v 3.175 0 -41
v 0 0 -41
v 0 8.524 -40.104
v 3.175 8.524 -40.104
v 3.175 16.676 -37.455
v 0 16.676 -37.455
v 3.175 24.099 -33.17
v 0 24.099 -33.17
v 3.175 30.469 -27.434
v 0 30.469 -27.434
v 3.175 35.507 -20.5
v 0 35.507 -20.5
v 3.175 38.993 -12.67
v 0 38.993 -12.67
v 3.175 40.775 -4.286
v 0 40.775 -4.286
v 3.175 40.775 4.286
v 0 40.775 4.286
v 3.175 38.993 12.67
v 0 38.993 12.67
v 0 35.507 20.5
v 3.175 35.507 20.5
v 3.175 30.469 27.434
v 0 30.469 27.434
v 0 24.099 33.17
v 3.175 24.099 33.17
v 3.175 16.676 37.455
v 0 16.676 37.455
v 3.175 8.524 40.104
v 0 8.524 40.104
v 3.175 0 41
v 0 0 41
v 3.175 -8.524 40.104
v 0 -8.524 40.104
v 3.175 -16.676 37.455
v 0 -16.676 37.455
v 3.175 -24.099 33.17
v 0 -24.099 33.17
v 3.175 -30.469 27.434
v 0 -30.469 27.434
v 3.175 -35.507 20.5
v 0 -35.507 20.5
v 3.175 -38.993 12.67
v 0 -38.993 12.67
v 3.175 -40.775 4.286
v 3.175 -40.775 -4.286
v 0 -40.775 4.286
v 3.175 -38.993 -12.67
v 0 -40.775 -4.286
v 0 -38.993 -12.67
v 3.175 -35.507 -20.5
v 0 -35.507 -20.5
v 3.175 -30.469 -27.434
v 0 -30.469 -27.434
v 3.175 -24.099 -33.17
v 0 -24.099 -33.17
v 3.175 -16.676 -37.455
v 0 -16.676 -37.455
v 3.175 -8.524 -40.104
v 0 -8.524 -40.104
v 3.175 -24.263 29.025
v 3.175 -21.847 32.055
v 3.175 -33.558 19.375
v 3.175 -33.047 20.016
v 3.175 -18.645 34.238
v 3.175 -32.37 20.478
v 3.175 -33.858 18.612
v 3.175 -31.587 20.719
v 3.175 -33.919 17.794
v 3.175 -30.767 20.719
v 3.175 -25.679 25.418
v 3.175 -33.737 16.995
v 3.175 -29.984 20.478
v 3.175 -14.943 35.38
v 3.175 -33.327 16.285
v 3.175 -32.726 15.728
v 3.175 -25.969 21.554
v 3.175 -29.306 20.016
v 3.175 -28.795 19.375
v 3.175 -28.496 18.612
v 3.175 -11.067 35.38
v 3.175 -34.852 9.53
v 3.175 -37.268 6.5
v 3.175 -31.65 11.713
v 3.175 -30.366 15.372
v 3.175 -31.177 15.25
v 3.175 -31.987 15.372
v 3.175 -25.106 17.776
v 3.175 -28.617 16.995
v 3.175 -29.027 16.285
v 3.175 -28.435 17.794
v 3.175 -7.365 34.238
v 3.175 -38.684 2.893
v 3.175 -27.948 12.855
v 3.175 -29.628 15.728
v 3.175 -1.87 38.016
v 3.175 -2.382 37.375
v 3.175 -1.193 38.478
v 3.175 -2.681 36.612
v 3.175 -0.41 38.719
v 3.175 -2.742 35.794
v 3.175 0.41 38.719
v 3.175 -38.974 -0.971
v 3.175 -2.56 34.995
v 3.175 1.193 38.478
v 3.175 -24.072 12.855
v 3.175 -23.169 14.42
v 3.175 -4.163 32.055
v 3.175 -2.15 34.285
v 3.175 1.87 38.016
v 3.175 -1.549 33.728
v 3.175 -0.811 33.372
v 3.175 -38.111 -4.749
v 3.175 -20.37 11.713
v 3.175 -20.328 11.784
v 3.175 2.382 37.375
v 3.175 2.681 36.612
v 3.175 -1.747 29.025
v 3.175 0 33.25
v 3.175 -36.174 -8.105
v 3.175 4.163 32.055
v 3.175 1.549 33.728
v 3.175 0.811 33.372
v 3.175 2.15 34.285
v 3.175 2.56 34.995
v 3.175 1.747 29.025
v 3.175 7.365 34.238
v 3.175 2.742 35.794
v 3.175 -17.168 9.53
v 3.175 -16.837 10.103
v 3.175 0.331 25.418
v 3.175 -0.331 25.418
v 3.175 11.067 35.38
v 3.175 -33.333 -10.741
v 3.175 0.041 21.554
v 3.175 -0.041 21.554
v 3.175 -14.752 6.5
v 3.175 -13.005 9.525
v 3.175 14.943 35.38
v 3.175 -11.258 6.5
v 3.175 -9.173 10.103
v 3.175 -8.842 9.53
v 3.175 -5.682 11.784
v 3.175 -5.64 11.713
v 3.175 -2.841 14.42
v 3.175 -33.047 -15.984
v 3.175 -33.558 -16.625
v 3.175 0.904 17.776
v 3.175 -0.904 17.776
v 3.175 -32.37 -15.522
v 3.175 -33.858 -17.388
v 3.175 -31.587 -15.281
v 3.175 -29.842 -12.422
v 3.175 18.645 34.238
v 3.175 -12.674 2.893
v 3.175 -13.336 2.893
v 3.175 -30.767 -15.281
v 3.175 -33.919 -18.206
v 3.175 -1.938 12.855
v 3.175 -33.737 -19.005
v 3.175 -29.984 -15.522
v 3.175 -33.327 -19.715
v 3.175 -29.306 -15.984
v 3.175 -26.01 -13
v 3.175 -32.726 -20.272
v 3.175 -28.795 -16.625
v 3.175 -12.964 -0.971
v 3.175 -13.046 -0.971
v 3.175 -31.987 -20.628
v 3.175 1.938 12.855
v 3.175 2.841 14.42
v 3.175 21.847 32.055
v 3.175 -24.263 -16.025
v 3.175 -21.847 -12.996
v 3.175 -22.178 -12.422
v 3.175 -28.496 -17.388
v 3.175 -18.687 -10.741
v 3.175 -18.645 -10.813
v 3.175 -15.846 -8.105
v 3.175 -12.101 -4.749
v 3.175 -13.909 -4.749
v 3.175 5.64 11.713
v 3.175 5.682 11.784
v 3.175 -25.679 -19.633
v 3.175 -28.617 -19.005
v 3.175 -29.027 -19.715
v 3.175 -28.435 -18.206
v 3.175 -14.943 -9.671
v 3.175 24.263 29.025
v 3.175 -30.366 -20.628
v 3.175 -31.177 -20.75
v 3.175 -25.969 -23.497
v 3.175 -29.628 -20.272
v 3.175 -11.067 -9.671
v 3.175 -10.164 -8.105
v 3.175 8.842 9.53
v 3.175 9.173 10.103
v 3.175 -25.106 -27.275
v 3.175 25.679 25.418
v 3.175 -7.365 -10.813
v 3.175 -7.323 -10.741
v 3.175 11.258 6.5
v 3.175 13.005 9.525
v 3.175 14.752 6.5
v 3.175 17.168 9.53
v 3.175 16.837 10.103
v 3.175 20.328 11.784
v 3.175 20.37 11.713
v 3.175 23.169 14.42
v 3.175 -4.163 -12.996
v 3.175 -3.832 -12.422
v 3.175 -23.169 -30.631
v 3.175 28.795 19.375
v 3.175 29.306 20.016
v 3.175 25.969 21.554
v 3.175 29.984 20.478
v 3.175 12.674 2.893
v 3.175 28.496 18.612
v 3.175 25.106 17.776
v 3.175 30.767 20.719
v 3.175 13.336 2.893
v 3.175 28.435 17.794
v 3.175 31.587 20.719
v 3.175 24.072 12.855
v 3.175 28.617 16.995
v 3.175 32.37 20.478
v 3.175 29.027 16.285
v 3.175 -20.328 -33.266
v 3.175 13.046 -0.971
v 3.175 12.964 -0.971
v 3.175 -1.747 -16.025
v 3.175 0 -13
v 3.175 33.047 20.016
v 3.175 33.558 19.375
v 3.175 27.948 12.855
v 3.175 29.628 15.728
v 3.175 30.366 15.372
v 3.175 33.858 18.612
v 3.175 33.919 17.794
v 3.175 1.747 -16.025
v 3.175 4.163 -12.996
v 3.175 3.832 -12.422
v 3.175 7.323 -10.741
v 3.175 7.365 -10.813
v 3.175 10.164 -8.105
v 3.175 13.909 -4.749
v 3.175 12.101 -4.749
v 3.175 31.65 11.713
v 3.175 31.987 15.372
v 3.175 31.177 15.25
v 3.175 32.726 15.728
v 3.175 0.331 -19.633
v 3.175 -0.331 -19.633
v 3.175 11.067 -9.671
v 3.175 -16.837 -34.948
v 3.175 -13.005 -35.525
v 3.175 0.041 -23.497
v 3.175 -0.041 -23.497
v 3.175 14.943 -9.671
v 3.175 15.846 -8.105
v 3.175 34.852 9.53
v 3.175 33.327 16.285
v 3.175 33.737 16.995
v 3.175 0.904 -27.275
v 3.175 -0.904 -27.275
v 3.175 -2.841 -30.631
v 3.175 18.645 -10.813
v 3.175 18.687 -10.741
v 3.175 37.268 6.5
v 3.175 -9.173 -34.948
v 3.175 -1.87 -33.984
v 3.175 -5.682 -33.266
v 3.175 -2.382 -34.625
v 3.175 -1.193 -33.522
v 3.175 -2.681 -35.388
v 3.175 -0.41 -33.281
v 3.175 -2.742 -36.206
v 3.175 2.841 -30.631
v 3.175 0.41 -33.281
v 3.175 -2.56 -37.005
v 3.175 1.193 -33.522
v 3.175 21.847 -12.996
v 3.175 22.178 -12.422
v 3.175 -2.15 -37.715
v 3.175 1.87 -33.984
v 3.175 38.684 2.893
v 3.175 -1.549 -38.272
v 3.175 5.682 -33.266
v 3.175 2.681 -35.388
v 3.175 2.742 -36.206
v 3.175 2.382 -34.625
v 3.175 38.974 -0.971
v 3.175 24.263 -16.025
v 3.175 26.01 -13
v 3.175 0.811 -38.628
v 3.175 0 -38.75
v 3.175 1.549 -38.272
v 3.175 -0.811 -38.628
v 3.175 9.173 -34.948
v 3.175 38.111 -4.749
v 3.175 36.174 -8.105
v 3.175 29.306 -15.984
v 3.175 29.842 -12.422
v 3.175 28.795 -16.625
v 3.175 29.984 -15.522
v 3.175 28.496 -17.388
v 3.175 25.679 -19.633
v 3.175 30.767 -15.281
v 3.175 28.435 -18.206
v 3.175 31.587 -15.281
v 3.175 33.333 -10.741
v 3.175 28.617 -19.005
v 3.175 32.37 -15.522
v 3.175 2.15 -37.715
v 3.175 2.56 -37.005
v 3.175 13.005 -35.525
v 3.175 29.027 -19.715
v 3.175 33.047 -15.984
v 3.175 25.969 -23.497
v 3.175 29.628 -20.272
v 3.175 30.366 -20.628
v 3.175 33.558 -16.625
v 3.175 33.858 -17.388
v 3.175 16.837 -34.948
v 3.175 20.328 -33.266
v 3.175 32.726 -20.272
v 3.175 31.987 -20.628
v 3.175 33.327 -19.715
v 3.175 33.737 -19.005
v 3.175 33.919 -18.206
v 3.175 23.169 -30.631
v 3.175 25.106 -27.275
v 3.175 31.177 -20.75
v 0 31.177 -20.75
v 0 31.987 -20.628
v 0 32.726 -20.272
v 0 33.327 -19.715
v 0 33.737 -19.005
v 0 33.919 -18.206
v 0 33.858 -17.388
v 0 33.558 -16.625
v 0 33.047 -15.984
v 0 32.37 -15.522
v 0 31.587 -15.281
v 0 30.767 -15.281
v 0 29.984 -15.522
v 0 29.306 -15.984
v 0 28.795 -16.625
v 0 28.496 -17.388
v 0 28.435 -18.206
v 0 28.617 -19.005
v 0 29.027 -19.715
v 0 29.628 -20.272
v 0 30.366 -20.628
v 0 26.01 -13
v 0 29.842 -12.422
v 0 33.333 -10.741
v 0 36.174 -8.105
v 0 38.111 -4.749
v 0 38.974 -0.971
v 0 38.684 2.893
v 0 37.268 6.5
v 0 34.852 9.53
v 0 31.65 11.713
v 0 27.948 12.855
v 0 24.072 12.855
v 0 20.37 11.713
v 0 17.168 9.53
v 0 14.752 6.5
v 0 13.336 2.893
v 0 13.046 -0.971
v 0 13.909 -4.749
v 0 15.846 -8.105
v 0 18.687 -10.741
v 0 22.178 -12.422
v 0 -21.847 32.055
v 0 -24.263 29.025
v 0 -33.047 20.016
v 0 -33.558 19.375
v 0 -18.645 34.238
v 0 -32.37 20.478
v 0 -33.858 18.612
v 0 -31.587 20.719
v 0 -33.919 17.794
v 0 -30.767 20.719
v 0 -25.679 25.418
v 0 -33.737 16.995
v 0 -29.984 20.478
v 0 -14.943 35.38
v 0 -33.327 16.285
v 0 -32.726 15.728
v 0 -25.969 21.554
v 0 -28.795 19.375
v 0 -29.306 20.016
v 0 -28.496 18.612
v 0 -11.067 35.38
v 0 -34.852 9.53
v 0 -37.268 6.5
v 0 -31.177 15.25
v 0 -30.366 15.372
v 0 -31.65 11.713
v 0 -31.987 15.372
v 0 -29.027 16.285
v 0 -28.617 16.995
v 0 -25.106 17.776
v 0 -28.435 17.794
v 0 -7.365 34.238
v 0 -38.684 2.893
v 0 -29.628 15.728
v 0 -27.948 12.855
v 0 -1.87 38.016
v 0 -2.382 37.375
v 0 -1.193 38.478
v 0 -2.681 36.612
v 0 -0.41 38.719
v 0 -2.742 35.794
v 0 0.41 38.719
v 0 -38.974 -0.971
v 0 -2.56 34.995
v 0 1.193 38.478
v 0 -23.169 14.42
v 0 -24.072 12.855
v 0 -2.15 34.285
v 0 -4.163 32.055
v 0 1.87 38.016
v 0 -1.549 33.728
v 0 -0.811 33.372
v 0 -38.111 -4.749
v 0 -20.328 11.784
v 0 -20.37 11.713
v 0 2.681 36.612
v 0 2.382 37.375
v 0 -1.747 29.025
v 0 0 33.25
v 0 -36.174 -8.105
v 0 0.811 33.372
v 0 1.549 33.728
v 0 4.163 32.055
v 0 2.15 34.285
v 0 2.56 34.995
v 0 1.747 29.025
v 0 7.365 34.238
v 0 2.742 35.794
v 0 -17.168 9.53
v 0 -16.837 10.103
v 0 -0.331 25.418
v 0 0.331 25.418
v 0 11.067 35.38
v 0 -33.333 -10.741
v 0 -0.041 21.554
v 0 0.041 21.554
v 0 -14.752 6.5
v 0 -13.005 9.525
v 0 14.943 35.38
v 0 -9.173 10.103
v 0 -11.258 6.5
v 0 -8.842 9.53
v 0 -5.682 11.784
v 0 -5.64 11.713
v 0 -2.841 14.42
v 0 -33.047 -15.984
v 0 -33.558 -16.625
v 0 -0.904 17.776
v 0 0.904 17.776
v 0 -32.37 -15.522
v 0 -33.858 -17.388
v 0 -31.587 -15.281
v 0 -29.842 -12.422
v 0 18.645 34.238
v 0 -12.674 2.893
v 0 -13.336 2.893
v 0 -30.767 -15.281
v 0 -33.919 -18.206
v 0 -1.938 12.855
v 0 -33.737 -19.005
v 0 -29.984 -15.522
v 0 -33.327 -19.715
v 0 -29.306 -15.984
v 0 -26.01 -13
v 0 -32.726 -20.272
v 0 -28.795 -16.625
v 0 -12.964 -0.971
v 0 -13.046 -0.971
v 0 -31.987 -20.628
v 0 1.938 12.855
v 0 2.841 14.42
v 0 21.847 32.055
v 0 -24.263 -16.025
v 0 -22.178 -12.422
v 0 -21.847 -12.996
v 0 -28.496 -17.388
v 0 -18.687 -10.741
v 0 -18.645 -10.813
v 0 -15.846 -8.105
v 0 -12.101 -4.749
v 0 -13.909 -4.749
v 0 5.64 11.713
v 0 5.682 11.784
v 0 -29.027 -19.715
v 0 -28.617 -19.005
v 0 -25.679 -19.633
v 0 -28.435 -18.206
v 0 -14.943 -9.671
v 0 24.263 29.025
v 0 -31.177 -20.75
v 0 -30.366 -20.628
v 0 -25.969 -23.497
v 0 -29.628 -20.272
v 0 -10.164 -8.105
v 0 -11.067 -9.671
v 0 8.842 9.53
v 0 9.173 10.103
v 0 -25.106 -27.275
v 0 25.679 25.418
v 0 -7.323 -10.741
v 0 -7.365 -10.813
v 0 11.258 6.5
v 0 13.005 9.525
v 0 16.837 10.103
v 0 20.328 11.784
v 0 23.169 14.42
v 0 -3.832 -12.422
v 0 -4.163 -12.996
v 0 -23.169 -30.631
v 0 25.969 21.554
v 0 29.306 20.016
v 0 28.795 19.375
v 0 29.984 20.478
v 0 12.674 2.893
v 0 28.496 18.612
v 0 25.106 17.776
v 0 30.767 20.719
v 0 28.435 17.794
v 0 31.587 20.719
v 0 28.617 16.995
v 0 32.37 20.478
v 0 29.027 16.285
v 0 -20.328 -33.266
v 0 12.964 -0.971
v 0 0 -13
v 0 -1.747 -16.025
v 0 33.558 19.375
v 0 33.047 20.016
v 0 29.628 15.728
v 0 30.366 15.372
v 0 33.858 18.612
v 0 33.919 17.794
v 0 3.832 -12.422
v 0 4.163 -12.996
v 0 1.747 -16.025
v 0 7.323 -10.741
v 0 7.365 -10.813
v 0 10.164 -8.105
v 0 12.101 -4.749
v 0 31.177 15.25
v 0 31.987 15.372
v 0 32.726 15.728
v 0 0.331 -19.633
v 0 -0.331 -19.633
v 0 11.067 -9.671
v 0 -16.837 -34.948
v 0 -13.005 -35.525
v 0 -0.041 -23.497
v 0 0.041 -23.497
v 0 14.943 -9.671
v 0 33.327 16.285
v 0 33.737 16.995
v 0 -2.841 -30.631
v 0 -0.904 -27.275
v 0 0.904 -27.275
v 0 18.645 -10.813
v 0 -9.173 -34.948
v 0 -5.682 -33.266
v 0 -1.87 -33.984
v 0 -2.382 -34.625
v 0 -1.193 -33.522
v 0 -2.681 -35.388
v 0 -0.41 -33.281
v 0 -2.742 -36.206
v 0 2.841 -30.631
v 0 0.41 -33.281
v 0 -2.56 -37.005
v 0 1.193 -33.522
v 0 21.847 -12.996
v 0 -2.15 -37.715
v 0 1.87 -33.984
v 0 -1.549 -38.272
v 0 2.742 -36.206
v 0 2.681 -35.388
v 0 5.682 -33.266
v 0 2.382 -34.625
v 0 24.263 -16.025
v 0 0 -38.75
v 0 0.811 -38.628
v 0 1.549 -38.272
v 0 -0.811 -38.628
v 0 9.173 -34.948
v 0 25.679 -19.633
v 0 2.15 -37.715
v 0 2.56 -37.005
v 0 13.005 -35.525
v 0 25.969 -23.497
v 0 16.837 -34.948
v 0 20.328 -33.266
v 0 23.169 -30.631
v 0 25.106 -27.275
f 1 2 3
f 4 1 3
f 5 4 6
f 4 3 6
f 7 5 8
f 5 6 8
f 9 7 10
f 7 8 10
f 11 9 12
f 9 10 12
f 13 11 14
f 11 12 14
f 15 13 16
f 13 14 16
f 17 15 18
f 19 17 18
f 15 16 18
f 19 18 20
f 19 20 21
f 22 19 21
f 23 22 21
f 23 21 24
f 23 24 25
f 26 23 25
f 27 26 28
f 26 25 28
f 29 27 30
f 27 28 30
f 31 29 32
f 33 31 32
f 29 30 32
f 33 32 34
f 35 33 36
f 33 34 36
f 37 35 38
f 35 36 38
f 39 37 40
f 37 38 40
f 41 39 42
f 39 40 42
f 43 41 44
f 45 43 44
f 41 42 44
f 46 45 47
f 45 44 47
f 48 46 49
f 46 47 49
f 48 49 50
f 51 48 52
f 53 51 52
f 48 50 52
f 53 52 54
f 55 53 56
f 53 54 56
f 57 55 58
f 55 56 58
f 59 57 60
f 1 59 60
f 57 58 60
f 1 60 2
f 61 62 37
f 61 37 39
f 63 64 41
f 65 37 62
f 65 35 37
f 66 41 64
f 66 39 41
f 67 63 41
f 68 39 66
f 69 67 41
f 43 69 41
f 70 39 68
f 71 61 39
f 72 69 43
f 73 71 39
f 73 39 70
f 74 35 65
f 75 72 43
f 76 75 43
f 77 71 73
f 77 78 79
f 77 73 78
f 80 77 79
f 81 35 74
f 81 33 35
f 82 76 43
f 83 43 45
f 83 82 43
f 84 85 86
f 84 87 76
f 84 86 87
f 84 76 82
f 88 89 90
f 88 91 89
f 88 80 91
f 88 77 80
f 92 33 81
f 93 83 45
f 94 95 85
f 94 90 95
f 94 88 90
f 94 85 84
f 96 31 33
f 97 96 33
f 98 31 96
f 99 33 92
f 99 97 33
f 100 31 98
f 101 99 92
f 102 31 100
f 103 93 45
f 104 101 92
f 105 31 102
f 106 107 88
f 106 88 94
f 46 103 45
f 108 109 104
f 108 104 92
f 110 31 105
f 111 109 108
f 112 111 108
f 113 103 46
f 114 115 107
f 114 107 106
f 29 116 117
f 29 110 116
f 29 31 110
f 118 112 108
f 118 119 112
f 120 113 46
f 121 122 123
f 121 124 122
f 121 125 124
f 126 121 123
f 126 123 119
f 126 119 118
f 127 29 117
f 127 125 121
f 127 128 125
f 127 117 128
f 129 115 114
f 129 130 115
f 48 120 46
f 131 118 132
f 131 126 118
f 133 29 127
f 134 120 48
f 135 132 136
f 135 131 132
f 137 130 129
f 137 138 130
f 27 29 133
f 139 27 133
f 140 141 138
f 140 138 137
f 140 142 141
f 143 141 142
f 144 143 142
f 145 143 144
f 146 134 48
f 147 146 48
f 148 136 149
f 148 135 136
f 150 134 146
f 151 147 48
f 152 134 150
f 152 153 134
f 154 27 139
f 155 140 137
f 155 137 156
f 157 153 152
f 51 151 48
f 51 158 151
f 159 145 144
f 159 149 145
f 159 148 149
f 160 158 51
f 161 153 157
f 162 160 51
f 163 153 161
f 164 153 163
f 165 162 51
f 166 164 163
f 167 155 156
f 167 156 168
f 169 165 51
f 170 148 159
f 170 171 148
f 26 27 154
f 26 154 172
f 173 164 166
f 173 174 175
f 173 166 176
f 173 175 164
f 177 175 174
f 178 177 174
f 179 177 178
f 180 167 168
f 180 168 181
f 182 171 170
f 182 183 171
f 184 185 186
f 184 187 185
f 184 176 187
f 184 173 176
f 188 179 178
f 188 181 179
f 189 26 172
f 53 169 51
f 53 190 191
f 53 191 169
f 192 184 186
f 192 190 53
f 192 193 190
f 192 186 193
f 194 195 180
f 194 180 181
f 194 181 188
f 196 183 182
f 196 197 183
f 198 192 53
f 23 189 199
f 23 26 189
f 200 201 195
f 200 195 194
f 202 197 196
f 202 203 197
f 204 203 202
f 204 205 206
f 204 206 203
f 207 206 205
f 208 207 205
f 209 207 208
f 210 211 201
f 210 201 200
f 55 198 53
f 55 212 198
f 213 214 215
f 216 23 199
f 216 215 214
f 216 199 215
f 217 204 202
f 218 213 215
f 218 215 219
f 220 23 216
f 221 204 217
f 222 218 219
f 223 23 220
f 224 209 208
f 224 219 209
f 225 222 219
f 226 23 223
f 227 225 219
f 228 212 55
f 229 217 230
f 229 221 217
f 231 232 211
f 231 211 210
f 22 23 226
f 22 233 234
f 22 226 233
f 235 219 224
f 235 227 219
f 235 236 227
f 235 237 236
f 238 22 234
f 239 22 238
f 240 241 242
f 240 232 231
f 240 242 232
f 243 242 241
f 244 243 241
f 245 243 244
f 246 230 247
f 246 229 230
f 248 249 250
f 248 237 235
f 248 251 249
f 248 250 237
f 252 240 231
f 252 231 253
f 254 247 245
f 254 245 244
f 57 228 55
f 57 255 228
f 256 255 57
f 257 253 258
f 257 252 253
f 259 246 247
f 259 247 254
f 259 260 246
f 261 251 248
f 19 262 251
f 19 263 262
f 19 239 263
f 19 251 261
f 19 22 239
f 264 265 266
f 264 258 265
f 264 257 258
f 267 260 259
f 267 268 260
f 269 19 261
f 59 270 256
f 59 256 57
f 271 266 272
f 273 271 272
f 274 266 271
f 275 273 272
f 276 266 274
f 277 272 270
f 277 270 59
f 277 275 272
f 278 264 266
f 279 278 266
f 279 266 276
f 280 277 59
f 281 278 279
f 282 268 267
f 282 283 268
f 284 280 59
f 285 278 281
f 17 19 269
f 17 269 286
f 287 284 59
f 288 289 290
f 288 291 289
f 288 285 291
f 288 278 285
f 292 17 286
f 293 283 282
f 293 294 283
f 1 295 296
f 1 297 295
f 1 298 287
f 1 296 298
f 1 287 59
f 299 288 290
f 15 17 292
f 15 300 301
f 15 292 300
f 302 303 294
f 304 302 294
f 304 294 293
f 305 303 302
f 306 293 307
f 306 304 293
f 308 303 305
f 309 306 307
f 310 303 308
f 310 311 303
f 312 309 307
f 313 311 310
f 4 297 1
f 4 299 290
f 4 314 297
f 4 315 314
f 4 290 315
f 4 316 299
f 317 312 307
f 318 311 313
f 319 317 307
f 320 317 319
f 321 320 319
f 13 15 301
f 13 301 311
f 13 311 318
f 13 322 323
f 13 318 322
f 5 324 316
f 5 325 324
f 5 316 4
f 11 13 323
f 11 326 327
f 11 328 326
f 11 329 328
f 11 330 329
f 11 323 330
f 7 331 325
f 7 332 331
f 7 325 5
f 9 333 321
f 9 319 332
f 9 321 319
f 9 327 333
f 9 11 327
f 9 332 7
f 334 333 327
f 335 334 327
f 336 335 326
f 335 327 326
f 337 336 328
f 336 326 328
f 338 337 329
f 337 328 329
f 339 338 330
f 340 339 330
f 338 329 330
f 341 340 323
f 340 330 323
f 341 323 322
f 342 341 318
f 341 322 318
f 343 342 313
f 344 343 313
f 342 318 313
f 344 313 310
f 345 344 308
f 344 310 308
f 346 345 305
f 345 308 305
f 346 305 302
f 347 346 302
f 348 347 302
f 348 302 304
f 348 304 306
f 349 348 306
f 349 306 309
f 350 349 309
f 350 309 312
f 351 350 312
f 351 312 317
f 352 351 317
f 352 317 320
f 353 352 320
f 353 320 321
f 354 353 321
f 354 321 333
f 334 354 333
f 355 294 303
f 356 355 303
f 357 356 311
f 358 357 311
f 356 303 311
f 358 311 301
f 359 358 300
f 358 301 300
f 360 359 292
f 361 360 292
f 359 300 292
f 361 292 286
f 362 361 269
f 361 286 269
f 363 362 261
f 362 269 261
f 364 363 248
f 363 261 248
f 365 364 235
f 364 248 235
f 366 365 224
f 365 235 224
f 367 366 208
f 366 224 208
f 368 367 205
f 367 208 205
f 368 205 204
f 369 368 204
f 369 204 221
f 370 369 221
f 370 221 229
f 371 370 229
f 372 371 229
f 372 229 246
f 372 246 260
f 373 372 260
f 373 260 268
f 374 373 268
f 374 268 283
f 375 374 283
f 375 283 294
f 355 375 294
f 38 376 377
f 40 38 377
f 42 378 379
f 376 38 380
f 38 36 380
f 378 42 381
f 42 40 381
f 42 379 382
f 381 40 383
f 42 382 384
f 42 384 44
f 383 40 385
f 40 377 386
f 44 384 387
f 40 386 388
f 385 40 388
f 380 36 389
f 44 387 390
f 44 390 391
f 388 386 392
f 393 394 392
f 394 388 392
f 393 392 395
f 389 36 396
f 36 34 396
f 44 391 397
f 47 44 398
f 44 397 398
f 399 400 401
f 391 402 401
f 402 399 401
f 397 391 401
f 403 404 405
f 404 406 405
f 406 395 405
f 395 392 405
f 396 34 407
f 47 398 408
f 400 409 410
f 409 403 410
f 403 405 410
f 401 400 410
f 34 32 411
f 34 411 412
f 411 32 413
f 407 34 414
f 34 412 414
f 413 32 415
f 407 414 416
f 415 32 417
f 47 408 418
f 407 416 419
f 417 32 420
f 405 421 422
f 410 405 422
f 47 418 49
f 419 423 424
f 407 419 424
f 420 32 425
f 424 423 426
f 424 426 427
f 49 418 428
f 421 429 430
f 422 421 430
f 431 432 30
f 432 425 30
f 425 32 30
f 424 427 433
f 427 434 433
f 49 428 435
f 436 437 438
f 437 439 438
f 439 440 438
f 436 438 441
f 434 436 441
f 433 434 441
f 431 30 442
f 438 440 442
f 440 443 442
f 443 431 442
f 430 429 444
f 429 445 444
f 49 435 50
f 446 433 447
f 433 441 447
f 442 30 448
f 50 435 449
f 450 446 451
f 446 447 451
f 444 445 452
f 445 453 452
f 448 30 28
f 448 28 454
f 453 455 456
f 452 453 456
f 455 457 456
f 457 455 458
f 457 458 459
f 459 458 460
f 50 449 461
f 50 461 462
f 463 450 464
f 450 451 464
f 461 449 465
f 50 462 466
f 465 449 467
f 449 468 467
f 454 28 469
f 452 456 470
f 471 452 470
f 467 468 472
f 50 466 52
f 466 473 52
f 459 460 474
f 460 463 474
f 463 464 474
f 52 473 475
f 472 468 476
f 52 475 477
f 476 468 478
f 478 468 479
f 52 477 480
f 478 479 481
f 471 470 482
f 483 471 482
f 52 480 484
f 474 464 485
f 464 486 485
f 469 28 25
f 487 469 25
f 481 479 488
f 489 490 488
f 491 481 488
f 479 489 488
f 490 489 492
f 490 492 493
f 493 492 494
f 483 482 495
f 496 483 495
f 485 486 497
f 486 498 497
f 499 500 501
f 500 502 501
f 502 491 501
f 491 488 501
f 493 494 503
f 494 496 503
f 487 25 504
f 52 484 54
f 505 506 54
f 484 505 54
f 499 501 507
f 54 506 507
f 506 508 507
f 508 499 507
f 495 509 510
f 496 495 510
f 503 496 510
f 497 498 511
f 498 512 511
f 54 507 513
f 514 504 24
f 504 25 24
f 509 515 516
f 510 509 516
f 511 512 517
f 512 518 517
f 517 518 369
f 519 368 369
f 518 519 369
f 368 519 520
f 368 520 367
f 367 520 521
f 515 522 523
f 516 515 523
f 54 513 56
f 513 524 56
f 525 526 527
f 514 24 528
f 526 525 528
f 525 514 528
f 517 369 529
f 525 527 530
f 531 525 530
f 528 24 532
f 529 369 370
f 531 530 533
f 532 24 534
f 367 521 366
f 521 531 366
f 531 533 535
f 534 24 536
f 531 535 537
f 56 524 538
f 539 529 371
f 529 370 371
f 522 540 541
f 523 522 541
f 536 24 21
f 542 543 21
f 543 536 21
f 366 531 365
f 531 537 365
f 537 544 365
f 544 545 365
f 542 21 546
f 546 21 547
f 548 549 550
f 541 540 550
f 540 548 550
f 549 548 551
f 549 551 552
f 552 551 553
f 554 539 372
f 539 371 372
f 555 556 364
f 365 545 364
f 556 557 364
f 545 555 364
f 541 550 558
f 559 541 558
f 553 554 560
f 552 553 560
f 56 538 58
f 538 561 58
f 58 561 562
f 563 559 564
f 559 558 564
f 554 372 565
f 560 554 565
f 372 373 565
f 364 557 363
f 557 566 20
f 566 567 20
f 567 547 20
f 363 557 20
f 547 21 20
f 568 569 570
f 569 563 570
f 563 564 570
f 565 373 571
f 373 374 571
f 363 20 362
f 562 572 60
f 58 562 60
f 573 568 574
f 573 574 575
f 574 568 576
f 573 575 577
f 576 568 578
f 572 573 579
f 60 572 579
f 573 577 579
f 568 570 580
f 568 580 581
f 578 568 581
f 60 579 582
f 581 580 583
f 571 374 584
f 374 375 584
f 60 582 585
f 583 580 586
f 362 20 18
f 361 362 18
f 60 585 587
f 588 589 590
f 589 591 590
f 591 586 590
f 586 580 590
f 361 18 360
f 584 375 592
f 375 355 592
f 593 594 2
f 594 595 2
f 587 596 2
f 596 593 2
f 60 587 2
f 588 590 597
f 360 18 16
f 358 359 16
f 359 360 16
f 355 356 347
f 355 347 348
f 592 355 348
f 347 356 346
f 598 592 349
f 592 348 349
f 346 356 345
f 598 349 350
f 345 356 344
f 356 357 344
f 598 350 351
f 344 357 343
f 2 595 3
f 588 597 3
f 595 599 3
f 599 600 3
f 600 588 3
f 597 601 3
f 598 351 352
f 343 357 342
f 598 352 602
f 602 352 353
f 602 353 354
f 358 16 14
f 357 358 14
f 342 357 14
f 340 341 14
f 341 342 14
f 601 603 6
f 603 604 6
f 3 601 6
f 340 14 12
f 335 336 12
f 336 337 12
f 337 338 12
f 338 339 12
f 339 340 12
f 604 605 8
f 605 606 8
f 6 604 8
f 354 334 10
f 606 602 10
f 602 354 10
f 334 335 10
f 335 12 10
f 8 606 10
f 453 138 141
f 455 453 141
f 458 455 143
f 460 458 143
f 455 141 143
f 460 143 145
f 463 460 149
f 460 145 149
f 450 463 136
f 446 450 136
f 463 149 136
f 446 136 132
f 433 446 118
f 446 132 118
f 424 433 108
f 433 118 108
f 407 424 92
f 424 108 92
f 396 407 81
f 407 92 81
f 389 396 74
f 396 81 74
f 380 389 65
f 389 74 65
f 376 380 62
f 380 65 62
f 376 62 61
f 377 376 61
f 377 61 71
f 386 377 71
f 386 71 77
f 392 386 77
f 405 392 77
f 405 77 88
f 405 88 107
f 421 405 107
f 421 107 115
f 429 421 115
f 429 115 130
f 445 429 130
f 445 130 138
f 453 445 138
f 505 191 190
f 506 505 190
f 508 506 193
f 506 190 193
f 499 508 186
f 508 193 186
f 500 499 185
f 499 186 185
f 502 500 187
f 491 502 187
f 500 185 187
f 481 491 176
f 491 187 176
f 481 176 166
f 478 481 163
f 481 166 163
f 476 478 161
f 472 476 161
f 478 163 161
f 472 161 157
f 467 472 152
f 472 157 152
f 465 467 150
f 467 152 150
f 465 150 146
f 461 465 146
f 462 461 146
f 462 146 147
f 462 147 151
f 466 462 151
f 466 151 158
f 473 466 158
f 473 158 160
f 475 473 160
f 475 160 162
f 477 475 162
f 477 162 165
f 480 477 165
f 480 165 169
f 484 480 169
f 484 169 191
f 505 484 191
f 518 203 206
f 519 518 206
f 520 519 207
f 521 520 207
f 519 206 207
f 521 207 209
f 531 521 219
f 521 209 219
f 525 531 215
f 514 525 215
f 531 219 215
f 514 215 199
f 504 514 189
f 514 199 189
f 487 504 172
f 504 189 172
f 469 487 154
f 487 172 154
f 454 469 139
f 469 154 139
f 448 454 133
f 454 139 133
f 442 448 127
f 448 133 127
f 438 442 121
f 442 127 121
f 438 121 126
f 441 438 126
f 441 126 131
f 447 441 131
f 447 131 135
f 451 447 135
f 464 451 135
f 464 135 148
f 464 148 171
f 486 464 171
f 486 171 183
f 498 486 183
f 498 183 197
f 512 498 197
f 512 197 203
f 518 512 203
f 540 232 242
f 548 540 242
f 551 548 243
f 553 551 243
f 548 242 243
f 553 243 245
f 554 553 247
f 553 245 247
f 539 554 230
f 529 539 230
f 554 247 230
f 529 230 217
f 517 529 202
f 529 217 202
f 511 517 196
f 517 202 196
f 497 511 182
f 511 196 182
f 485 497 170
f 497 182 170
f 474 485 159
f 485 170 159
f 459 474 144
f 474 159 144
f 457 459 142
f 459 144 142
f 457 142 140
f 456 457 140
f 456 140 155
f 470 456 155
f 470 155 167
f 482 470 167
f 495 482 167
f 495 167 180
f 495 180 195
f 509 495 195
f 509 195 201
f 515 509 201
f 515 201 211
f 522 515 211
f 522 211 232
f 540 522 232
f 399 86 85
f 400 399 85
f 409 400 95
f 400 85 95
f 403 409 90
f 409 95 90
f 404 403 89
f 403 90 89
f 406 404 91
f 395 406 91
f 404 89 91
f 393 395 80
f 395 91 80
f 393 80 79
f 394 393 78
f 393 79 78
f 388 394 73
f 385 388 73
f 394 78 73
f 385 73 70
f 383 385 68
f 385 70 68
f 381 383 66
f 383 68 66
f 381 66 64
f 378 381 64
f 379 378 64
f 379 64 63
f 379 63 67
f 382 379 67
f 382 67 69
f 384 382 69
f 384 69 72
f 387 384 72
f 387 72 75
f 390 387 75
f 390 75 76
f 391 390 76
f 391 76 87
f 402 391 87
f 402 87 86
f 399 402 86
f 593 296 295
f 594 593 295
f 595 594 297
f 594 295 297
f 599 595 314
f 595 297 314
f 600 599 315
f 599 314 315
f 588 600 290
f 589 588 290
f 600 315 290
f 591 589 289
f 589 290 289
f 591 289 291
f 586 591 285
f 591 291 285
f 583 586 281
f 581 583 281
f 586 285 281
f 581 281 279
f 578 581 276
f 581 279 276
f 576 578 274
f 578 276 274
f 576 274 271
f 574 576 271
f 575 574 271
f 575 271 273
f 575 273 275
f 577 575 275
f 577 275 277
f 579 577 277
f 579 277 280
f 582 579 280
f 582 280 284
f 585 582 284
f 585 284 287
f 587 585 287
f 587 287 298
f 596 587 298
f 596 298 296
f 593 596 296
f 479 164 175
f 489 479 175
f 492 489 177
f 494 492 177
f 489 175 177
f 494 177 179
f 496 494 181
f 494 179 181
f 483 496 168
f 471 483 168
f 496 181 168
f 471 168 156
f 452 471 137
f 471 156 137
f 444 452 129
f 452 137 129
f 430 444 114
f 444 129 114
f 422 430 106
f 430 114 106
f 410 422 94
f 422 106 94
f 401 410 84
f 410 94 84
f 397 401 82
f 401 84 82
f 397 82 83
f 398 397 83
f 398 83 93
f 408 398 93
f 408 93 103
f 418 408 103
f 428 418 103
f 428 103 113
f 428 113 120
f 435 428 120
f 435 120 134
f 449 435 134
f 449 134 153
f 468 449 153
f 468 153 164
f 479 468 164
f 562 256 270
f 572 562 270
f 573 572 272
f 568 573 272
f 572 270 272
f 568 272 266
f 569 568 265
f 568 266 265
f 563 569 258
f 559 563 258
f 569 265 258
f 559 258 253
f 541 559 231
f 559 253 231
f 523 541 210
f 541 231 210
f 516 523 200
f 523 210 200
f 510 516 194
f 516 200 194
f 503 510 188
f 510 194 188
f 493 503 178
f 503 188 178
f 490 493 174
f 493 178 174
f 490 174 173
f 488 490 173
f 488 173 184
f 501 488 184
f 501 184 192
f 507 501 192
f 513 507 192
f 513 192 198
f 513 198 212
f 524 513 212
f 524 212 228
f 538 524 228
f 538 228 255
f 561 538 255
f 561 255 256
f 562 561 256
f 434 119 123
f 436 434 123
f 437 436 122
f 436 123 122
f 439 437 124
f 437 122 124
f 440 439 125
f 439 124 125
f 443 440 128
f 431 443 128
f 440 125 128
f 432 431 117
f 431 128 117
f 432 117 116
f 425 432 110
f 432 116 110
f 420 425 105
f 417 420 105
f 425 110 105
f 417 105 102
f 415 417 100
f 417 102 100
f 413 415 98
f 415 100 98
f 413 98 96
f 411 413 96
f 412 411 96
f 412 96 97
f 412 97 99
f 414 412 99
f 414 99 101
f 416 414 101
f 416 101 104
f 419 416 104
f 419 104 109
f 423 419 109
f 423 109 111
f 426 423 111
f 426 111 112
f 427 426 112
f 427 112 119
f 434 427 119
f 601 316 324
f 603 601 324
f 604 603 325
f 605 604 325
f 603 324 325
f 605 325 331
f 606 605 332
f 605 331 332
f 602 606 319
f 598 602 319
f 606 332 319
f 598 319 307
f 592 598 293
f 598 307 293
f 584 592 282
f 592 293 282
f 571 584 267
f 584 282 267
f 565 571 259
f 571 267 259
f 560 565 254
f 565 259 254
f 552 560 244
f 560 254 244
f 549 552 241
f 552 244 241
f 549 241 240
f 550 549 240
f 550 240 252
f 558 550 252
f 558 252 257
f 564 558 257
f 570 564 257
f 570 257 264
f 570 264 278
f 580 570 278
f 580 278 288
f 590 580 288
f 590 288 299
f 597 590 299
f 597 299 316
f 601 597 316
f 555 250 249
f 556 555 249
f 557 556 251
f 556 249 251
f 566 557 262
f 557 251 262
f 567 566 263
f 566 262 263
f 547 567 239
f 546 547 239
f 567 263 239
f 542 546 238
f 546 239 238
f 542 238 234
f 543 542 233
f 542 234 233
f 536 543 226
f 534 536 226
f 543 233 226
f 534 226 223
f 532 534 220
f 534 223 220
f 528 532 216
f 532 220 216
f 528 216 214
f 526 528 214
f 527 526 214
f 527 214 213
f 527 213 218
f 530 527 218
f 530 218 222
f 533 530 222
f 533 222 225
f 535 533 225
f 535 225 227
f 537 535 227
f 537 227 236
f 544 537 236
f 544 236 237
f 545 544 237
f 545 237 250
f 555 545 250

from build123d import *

# Parameters (mm, degrees)
SKETCH1_R           = 41
BOSS_EXTRUDE1_DEPTH = 3.175
SKETCH2_R           = 13
SKETCH2_R_2         = 2.75
CUT_EXTRUDE1_DEPTH  = 25


with BuildPart() as part:
    # Sketch1 → Boss-Extrude1 (new body)
    with BuildSketch(Plane(origin=(0, 0, 0), x_dir=(0, 0, -1), z_dir=(1, 0, 0))):
        Circle(SKETCH1_R)
    extrude(amount=BOSS_EXTRUDE1_DEPTH)

    # Sketch2 → Cut-Extrude1 (cut)
    with BuildSketch(Plane(origin=(3.175, 0, 0), x_dir=(0, 0, -1), z_dir=(1, 0, 0))):
        Circle(SKETCH2_R)
        with Locations((0, 26.01)):
            Circle(SKETCH2_R)
        with Locations((22.525320752, 13.005)):
            Circle(SKETCH2_R)
        with Locations((22.525320752, -13.005)):
            Circle(SKETCH2_R)
        with Locations((0, -26.01)):
            Circle(SKETCH2_R)
        with Locations((-22.525320752, -13.005)):
            Circle(SKETCH2_R)
        with Locations((-22.525320752, 13.005)):
            Circle(SKETCH2_R)
        with Locations((-18, 31.176914536)):
            Circle(SKETCH2_R_2)
        with Locations((18, 31.176914536)):
            Circle(SKETCH2_R_2)
        with Locations((36, 0)):
            Circle(SKETCH2_R_2)
        with Locations((18, -31.176914536)):
            Circle(SKETCH2_R_2)
        with Locations((-18, -31.176914536)):
            Circle(SKETCH2_R_2)
        with Locations((-36, 0)):
            Circle(SKETCH2_R_2)
    extrude(amount=-CUT_EXTRUDE1_DEPTH, mode=Mode.SUBTRACT)


solid = part.part
